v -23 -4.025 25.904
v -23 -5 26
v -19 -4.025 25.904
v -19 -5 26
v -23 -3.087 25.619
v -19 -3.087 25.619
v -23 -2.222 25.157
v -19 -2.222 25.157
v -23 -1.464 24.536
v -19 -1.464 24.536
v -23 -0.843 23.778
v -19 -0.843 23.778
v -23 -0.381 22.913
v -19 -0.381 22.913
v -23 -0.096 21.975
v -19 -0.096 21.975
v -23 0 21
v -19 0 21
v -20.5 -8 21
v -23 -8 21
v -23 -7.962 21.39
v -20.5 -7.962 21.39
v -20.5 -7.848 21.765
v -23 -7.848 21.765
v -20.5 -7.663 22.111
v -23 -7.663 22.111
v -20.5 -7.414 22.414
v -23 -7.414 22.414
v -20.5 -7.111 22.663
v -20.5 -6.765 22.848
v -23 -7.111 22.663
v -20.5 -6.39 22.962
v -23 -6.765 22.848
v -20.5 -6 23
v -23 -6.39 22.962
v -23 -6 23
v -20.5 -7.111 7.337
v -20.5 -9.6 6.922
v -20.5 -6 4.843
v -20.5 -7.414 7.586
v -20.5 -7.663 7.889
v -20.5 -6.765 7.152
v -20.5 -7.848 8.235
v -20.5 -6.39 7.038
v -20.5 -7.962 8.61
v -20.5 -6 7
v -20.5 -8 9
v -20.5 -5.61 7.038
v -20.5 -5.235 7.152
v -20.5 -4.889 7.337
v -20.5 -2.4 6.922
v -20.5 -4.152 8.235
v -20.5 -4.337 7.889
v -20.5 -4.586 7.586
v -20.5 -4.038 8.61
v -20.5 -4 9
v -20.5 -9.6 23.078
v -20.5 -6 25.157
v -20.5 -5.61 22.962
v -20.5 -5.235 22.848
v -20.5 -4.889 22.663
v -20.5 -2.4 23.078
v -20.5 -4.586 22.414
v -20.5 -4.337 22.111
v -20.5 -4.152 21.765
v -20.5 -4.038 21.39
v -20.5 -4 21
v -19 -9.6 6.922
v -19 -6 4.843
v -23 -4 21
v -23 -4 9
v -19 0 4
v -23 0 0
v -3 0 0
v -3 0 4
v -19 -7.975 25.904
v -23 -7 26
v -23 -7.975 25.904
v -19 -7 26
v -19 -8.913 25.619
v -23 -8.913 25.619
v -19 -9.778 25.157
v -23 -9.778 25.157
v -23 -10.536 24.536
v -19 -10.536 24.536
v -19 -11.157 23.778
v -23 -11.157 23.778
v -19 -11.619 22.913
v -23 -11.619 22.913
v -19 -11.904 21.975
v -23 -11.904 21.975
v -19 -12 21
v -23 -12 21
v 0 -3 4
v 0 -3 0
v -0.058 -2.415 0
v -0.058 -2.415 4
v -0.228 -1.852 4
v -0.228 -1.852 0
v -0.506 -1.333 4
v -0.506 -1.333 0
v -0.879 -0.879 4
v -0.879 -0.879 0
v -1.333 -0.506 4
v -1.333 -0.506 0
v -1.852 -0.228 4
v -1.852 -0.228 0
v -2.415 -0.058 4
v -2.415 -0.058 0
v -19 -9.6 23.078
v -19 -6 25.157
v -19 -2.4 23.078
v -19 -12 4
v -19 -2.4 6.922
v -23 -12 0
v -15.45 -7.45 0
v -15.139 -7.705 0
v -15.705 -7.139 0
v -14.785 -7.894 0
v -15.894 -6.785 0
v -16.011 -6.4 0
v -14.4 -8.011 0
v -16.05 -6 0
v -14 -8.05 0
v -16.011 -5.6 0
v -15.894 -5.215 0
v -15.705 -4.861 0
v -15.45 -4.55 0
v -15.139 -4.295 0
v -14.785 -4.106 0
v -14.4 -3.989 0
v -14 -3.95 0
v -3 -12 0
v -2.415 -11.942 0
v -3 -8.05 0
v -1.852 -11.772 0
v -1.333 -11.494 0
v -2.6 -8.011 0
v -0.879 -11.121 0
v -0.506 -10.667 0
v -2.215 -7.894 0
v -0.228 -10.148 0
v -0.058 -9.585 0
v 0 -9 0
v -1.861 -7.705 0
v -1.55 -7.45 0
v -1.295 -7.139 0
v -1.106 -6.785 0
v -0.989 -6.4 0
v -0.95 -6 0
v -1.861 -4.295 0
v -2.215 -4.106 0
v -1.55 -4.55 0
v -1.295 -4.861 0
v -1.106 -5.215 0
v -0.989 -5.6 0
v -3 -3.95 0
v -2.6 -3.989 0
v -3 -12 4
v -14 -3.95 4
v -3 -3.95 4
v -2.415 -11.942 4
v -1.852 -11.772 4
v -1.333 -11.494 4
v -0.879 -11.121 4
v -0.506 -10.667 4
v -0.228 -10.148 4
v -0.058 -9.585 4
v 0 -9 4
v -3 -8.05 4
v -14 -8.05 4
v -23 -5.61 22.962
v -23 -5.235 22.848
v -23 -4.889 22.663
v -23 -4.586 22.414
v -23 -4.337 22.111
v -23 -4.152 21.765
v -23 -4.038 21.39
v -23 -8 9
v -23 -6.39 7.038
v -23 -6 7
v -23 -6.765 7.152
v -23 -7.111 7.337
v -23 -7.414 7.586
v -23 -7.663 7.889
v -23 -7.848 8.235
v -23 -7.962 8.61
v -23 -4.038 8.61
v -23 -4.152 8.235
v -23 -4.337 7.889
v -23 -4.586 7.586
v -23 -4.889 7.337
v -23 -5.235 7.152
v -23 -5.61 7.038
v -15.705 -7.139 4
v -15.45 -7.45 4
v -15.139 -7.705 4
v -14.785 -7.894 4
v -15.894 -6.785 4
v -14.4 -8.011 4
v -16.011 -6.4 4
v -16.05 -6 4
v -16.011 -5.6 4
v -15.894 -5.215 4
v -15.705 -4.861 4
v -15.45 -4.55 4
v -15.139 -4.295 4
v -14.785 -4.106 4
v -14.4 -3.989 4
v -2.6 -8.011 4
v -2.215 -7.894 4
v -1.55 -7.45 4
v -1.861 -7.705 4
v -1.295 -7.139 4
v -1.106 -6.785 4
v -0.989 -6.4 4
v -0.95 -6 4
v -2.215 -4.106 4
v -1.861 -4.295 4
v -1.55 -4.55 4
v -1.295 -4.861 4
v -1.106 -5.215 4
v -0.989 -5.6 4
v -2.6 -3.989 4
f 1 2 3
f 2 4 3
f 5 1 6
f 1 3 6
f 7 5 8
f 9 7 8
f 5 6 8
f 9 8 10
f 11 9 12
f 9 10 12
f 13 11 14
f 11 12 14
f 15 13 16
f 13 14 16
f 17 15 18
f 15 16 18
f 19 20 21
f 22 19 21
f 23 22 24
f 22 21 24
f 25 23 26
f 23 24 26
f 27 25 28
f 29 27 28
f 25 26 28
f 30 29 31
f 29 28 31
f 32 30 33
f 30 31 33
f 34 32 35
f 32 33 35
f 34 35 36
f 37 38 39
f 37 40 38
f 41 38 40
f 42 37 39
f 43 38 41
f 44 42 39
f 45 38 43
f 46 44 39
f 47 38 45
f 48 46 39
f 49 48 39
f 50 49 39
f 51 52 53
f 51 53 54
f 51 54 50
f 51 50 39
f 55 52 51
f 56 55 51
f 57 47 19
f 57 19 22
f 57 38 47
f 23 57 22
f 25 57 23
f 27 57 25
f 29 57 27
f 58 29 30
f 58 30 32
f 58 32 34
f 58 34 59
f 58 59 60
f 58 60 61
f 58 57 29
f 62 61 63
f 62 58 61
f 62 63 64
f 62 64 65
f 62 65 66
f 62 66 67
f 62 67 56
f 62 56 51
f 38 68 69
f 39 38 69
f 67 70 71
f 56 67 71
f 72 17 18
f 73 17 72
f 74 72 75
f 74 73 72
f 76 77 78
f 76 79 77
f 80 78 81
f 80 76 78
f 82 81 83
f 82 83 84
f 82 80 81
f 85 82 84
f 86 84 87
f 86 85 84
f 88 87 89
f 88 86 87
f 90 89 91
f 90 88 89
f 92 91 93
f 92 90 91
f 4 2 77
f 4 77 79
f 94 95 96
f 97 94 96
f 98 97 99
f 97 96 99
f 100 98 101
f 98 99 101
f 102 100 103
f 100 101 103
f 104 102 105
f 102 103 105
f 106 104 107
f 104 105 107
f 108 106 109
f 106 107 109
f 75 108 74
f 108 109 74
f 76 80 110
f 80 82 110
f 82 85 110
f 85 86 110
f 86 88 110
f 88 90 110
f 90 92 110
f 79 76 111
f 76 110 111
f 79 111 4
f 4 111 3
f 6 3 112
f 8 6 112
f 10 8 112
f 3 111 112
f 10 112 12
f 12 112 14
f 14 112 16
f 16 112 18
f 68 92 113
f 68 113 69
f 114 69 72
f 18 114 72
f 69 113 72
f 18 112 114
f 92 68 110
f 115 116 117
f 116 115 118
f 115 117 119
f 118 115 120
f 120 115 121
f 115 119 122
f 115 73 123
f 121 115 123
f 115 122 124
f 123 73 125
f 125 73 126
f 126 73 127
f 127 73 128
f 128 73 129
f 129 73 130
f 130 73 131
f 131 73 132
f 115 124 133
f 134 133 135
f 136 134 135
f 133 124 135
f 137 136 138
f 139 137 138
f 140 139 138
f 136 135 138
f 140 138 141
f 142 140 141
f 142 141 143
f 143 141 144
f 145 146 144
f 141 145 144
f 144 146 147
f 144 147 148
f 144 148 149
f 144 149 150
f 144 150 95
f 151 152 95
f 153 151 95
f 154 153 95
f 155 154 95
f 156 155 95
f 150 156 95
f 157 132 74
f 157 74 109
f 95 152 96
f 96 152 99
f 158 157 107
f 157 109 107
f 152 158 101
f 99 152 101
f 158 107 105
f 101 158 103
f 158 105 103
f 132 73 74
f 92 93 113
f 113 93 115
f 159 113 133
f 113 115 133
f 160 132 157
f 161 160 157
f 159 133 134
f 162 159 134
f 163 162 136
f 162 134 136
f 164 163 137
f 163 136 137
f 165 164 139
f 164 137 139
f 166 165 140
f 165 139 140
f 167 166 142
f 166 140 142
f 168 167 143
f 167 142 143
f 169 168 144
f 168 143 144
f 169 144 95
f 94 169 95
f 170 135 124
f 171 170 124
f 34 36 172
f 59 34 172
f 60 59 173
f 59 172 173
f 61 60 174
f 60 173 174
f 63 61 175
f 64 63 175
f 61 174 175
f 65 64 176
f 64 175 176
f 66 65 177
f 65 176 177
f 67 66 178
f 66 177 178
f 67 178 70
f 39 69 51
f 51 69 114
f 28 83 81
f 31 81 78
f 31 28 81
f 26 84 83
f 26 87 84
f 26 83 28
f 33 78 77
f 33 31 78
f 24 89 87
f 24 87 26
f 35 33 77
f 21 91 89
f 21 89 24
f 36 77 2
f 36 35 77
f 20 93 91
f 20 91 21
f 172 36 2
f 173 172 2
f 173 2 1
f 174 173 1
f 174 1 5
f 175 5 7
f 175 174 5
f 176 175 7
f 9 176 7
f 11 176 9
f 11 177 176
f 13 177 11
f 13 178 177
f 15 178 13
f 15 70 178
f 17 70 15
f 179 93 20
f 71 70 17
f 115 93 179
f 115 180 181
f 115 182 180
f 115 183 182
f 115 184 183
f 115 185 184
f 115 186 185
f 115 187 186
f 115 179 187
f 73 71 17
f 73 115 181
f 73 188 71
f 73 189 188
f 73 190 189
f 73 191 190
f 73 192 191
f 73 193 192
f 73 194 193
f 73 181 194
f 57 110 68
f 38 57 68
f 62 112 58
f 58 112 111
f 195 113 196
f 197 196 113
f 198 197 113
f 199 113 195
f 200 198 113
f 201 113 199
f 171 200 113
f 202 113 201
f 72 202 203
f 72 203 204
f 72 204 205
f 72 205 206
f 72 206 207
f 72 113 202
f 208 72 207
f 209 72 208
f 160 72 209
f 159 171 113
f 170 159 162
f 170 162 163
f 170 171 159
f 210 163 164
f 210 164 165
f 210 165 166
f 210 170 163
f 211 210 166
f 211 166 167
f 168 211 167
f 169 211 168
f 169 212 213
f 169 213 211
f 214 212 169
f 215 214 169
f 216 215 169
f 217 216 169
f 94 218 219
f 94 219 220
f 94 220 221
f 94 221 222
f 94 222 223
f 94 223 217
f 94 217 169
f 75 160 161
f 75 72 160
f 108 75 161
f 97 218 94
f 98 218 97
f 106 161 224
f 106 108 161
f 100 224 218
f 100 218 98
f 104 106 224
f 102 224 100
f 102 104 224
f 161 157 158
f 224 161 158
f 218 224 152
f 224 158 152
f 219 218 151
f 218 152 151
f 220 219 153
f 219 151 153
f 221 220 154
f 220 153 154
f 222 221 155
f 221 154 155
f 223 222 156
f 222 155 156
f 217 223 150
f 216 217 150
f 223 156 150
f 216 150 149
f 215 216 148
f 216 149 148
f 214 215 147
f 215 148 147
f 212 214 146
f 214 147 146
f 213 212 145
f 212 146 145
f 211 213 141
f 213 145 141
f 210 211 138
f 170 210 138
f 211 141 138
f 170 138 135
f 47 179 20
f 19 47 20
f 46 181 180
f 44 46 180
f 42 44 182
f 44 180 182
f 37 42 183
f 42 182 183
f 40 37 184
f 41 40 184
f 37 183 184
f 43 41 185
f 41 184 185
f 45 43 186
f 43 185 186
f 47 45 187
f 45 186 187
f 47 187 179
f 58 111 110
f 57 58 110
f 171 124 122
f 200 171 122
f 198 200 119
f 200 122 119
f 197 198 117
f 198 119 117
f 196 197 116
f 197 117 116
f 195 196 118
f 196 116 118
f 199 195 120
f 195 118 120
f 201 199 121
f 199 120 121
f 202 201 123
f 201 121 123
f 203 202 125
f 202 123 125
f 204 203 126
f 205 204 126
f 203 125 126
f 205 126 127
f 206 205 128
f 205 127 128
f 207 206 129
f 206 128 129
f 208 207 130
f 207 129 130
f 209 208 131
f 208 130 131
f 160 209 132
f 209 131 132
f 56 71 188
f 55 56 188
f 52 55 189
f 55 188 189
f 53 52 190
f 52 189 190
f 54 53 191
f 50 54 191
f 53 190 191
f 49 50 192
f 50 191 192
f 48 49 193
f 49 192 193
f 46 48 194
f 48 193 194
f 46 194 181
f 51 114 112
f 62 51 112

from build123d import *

# Parameters (mm, degrees)
F1_DEPTH = 4
F2_W     = 4
F2_H     = 12
F3_DEPTH = 22
F5_DEPTH = 25
F7_DEPTH = 1.5
F8_R     = 5


# Not quite as in the source:
# - a feature names something its author has since deleted; it is built from what else it names


with BuildPart() as f1:
    # F0 (on Top) → F1 (new body)
    with BuildSketch(Plane.XY):
        with BuildLine():
            ThreePointArc((0, -3), (-0.8786796564, -0.8786796564), (-3, 0))
            Line((-3, 0), (-23, 0))
            Line((-23, 0), (-23, -12))
            Line((-23, -12), (-3, -12))
            ThreePointArc((-3, -12), (-0.8786796564, -11.1213203436), (0, -9))
            Line((0, -9), (0, -3))
        make_face()
        with BuildLine():
            ThreePointArc((-3, -3.95), (-0.95, -6), (-3, -8.05))
            Line((-3, -8.05), (-14, -8.05))
            ThreePointArc((-14, -8.05), (-16.05, -6), (-14, -3.95))
            Line((-14, -3.95), (-3, -3.95))
        make_face(mode=Mode.SUBTRACT)
    extrude(amount=F1_DEPTH)

    # F2 (on face) → F3 (join)
    with BuildSketch(Plane.XY.offset(4)):
        with Locations((-21, -6)):
            Rectangle(F2_W, F2_H)
    extrude(amount=F3_DEPTH)

    # F4 (on face) → F5 (cut)
    with BuildSketch(Plane(origin=(-23, 0, 0), x_dir=(0, -1, 0), z_dir=(-1, 0, 0))):
        with BuildLine():
            Line((4, 21), (4, 9))
            ThreePointArc((4, 9), (4.5857864376, 7.5857864376), (6, 7))
            ThreePointArc((6, 7), (7.4142135624, 7.5857864376), (8, 9))
            Line((8, 9), (8, 21))
            ThreePointArc((8, 21), (7.4142135624, 22.4142135624), (6, 23))
            ThreePointArc((6, 23), (4.5857864376, 22.4142135624), (4, 21))
        make_face()
    extrude(amount=-F5_DEPTH, mode=Mode.SUBTRACT)

    # F6 (on face) → F7 (cut)
    with BuildSketch(Plane.YZ.offset(-19)):
        Polygon((-6, 4.8430780618), (-2.4, 6.9215390309), (-2.4, 23.0784609691), (-6, 25.1569219382), (-9.6, 23.0784609691), (-9.6, 6.9215390309), align=None)
        with BuildLine():
            ThreePointArc((-8, 21), (-6, 23), (-4, 21))
            Line((-4, 21), (-4, 9))
            ThreePointArc((-4, 9), (-6, 7), (-8, 9))
            Line((-8, 9), (-8, 21))
        make_face(mode=Mode.SUBTRACT)
    extrude(amount=-F7_DEPTH, mode=Mode.SUBTRACT)

    # F8
    f8_edges = [f1.edges().sort_by_distance(p)[0] for p in [
        (-21, -12, 26),
        (-21, 0, 26),
    ]]
    fillet(f8_edges, radius=F8_R)


solid = f1.part
